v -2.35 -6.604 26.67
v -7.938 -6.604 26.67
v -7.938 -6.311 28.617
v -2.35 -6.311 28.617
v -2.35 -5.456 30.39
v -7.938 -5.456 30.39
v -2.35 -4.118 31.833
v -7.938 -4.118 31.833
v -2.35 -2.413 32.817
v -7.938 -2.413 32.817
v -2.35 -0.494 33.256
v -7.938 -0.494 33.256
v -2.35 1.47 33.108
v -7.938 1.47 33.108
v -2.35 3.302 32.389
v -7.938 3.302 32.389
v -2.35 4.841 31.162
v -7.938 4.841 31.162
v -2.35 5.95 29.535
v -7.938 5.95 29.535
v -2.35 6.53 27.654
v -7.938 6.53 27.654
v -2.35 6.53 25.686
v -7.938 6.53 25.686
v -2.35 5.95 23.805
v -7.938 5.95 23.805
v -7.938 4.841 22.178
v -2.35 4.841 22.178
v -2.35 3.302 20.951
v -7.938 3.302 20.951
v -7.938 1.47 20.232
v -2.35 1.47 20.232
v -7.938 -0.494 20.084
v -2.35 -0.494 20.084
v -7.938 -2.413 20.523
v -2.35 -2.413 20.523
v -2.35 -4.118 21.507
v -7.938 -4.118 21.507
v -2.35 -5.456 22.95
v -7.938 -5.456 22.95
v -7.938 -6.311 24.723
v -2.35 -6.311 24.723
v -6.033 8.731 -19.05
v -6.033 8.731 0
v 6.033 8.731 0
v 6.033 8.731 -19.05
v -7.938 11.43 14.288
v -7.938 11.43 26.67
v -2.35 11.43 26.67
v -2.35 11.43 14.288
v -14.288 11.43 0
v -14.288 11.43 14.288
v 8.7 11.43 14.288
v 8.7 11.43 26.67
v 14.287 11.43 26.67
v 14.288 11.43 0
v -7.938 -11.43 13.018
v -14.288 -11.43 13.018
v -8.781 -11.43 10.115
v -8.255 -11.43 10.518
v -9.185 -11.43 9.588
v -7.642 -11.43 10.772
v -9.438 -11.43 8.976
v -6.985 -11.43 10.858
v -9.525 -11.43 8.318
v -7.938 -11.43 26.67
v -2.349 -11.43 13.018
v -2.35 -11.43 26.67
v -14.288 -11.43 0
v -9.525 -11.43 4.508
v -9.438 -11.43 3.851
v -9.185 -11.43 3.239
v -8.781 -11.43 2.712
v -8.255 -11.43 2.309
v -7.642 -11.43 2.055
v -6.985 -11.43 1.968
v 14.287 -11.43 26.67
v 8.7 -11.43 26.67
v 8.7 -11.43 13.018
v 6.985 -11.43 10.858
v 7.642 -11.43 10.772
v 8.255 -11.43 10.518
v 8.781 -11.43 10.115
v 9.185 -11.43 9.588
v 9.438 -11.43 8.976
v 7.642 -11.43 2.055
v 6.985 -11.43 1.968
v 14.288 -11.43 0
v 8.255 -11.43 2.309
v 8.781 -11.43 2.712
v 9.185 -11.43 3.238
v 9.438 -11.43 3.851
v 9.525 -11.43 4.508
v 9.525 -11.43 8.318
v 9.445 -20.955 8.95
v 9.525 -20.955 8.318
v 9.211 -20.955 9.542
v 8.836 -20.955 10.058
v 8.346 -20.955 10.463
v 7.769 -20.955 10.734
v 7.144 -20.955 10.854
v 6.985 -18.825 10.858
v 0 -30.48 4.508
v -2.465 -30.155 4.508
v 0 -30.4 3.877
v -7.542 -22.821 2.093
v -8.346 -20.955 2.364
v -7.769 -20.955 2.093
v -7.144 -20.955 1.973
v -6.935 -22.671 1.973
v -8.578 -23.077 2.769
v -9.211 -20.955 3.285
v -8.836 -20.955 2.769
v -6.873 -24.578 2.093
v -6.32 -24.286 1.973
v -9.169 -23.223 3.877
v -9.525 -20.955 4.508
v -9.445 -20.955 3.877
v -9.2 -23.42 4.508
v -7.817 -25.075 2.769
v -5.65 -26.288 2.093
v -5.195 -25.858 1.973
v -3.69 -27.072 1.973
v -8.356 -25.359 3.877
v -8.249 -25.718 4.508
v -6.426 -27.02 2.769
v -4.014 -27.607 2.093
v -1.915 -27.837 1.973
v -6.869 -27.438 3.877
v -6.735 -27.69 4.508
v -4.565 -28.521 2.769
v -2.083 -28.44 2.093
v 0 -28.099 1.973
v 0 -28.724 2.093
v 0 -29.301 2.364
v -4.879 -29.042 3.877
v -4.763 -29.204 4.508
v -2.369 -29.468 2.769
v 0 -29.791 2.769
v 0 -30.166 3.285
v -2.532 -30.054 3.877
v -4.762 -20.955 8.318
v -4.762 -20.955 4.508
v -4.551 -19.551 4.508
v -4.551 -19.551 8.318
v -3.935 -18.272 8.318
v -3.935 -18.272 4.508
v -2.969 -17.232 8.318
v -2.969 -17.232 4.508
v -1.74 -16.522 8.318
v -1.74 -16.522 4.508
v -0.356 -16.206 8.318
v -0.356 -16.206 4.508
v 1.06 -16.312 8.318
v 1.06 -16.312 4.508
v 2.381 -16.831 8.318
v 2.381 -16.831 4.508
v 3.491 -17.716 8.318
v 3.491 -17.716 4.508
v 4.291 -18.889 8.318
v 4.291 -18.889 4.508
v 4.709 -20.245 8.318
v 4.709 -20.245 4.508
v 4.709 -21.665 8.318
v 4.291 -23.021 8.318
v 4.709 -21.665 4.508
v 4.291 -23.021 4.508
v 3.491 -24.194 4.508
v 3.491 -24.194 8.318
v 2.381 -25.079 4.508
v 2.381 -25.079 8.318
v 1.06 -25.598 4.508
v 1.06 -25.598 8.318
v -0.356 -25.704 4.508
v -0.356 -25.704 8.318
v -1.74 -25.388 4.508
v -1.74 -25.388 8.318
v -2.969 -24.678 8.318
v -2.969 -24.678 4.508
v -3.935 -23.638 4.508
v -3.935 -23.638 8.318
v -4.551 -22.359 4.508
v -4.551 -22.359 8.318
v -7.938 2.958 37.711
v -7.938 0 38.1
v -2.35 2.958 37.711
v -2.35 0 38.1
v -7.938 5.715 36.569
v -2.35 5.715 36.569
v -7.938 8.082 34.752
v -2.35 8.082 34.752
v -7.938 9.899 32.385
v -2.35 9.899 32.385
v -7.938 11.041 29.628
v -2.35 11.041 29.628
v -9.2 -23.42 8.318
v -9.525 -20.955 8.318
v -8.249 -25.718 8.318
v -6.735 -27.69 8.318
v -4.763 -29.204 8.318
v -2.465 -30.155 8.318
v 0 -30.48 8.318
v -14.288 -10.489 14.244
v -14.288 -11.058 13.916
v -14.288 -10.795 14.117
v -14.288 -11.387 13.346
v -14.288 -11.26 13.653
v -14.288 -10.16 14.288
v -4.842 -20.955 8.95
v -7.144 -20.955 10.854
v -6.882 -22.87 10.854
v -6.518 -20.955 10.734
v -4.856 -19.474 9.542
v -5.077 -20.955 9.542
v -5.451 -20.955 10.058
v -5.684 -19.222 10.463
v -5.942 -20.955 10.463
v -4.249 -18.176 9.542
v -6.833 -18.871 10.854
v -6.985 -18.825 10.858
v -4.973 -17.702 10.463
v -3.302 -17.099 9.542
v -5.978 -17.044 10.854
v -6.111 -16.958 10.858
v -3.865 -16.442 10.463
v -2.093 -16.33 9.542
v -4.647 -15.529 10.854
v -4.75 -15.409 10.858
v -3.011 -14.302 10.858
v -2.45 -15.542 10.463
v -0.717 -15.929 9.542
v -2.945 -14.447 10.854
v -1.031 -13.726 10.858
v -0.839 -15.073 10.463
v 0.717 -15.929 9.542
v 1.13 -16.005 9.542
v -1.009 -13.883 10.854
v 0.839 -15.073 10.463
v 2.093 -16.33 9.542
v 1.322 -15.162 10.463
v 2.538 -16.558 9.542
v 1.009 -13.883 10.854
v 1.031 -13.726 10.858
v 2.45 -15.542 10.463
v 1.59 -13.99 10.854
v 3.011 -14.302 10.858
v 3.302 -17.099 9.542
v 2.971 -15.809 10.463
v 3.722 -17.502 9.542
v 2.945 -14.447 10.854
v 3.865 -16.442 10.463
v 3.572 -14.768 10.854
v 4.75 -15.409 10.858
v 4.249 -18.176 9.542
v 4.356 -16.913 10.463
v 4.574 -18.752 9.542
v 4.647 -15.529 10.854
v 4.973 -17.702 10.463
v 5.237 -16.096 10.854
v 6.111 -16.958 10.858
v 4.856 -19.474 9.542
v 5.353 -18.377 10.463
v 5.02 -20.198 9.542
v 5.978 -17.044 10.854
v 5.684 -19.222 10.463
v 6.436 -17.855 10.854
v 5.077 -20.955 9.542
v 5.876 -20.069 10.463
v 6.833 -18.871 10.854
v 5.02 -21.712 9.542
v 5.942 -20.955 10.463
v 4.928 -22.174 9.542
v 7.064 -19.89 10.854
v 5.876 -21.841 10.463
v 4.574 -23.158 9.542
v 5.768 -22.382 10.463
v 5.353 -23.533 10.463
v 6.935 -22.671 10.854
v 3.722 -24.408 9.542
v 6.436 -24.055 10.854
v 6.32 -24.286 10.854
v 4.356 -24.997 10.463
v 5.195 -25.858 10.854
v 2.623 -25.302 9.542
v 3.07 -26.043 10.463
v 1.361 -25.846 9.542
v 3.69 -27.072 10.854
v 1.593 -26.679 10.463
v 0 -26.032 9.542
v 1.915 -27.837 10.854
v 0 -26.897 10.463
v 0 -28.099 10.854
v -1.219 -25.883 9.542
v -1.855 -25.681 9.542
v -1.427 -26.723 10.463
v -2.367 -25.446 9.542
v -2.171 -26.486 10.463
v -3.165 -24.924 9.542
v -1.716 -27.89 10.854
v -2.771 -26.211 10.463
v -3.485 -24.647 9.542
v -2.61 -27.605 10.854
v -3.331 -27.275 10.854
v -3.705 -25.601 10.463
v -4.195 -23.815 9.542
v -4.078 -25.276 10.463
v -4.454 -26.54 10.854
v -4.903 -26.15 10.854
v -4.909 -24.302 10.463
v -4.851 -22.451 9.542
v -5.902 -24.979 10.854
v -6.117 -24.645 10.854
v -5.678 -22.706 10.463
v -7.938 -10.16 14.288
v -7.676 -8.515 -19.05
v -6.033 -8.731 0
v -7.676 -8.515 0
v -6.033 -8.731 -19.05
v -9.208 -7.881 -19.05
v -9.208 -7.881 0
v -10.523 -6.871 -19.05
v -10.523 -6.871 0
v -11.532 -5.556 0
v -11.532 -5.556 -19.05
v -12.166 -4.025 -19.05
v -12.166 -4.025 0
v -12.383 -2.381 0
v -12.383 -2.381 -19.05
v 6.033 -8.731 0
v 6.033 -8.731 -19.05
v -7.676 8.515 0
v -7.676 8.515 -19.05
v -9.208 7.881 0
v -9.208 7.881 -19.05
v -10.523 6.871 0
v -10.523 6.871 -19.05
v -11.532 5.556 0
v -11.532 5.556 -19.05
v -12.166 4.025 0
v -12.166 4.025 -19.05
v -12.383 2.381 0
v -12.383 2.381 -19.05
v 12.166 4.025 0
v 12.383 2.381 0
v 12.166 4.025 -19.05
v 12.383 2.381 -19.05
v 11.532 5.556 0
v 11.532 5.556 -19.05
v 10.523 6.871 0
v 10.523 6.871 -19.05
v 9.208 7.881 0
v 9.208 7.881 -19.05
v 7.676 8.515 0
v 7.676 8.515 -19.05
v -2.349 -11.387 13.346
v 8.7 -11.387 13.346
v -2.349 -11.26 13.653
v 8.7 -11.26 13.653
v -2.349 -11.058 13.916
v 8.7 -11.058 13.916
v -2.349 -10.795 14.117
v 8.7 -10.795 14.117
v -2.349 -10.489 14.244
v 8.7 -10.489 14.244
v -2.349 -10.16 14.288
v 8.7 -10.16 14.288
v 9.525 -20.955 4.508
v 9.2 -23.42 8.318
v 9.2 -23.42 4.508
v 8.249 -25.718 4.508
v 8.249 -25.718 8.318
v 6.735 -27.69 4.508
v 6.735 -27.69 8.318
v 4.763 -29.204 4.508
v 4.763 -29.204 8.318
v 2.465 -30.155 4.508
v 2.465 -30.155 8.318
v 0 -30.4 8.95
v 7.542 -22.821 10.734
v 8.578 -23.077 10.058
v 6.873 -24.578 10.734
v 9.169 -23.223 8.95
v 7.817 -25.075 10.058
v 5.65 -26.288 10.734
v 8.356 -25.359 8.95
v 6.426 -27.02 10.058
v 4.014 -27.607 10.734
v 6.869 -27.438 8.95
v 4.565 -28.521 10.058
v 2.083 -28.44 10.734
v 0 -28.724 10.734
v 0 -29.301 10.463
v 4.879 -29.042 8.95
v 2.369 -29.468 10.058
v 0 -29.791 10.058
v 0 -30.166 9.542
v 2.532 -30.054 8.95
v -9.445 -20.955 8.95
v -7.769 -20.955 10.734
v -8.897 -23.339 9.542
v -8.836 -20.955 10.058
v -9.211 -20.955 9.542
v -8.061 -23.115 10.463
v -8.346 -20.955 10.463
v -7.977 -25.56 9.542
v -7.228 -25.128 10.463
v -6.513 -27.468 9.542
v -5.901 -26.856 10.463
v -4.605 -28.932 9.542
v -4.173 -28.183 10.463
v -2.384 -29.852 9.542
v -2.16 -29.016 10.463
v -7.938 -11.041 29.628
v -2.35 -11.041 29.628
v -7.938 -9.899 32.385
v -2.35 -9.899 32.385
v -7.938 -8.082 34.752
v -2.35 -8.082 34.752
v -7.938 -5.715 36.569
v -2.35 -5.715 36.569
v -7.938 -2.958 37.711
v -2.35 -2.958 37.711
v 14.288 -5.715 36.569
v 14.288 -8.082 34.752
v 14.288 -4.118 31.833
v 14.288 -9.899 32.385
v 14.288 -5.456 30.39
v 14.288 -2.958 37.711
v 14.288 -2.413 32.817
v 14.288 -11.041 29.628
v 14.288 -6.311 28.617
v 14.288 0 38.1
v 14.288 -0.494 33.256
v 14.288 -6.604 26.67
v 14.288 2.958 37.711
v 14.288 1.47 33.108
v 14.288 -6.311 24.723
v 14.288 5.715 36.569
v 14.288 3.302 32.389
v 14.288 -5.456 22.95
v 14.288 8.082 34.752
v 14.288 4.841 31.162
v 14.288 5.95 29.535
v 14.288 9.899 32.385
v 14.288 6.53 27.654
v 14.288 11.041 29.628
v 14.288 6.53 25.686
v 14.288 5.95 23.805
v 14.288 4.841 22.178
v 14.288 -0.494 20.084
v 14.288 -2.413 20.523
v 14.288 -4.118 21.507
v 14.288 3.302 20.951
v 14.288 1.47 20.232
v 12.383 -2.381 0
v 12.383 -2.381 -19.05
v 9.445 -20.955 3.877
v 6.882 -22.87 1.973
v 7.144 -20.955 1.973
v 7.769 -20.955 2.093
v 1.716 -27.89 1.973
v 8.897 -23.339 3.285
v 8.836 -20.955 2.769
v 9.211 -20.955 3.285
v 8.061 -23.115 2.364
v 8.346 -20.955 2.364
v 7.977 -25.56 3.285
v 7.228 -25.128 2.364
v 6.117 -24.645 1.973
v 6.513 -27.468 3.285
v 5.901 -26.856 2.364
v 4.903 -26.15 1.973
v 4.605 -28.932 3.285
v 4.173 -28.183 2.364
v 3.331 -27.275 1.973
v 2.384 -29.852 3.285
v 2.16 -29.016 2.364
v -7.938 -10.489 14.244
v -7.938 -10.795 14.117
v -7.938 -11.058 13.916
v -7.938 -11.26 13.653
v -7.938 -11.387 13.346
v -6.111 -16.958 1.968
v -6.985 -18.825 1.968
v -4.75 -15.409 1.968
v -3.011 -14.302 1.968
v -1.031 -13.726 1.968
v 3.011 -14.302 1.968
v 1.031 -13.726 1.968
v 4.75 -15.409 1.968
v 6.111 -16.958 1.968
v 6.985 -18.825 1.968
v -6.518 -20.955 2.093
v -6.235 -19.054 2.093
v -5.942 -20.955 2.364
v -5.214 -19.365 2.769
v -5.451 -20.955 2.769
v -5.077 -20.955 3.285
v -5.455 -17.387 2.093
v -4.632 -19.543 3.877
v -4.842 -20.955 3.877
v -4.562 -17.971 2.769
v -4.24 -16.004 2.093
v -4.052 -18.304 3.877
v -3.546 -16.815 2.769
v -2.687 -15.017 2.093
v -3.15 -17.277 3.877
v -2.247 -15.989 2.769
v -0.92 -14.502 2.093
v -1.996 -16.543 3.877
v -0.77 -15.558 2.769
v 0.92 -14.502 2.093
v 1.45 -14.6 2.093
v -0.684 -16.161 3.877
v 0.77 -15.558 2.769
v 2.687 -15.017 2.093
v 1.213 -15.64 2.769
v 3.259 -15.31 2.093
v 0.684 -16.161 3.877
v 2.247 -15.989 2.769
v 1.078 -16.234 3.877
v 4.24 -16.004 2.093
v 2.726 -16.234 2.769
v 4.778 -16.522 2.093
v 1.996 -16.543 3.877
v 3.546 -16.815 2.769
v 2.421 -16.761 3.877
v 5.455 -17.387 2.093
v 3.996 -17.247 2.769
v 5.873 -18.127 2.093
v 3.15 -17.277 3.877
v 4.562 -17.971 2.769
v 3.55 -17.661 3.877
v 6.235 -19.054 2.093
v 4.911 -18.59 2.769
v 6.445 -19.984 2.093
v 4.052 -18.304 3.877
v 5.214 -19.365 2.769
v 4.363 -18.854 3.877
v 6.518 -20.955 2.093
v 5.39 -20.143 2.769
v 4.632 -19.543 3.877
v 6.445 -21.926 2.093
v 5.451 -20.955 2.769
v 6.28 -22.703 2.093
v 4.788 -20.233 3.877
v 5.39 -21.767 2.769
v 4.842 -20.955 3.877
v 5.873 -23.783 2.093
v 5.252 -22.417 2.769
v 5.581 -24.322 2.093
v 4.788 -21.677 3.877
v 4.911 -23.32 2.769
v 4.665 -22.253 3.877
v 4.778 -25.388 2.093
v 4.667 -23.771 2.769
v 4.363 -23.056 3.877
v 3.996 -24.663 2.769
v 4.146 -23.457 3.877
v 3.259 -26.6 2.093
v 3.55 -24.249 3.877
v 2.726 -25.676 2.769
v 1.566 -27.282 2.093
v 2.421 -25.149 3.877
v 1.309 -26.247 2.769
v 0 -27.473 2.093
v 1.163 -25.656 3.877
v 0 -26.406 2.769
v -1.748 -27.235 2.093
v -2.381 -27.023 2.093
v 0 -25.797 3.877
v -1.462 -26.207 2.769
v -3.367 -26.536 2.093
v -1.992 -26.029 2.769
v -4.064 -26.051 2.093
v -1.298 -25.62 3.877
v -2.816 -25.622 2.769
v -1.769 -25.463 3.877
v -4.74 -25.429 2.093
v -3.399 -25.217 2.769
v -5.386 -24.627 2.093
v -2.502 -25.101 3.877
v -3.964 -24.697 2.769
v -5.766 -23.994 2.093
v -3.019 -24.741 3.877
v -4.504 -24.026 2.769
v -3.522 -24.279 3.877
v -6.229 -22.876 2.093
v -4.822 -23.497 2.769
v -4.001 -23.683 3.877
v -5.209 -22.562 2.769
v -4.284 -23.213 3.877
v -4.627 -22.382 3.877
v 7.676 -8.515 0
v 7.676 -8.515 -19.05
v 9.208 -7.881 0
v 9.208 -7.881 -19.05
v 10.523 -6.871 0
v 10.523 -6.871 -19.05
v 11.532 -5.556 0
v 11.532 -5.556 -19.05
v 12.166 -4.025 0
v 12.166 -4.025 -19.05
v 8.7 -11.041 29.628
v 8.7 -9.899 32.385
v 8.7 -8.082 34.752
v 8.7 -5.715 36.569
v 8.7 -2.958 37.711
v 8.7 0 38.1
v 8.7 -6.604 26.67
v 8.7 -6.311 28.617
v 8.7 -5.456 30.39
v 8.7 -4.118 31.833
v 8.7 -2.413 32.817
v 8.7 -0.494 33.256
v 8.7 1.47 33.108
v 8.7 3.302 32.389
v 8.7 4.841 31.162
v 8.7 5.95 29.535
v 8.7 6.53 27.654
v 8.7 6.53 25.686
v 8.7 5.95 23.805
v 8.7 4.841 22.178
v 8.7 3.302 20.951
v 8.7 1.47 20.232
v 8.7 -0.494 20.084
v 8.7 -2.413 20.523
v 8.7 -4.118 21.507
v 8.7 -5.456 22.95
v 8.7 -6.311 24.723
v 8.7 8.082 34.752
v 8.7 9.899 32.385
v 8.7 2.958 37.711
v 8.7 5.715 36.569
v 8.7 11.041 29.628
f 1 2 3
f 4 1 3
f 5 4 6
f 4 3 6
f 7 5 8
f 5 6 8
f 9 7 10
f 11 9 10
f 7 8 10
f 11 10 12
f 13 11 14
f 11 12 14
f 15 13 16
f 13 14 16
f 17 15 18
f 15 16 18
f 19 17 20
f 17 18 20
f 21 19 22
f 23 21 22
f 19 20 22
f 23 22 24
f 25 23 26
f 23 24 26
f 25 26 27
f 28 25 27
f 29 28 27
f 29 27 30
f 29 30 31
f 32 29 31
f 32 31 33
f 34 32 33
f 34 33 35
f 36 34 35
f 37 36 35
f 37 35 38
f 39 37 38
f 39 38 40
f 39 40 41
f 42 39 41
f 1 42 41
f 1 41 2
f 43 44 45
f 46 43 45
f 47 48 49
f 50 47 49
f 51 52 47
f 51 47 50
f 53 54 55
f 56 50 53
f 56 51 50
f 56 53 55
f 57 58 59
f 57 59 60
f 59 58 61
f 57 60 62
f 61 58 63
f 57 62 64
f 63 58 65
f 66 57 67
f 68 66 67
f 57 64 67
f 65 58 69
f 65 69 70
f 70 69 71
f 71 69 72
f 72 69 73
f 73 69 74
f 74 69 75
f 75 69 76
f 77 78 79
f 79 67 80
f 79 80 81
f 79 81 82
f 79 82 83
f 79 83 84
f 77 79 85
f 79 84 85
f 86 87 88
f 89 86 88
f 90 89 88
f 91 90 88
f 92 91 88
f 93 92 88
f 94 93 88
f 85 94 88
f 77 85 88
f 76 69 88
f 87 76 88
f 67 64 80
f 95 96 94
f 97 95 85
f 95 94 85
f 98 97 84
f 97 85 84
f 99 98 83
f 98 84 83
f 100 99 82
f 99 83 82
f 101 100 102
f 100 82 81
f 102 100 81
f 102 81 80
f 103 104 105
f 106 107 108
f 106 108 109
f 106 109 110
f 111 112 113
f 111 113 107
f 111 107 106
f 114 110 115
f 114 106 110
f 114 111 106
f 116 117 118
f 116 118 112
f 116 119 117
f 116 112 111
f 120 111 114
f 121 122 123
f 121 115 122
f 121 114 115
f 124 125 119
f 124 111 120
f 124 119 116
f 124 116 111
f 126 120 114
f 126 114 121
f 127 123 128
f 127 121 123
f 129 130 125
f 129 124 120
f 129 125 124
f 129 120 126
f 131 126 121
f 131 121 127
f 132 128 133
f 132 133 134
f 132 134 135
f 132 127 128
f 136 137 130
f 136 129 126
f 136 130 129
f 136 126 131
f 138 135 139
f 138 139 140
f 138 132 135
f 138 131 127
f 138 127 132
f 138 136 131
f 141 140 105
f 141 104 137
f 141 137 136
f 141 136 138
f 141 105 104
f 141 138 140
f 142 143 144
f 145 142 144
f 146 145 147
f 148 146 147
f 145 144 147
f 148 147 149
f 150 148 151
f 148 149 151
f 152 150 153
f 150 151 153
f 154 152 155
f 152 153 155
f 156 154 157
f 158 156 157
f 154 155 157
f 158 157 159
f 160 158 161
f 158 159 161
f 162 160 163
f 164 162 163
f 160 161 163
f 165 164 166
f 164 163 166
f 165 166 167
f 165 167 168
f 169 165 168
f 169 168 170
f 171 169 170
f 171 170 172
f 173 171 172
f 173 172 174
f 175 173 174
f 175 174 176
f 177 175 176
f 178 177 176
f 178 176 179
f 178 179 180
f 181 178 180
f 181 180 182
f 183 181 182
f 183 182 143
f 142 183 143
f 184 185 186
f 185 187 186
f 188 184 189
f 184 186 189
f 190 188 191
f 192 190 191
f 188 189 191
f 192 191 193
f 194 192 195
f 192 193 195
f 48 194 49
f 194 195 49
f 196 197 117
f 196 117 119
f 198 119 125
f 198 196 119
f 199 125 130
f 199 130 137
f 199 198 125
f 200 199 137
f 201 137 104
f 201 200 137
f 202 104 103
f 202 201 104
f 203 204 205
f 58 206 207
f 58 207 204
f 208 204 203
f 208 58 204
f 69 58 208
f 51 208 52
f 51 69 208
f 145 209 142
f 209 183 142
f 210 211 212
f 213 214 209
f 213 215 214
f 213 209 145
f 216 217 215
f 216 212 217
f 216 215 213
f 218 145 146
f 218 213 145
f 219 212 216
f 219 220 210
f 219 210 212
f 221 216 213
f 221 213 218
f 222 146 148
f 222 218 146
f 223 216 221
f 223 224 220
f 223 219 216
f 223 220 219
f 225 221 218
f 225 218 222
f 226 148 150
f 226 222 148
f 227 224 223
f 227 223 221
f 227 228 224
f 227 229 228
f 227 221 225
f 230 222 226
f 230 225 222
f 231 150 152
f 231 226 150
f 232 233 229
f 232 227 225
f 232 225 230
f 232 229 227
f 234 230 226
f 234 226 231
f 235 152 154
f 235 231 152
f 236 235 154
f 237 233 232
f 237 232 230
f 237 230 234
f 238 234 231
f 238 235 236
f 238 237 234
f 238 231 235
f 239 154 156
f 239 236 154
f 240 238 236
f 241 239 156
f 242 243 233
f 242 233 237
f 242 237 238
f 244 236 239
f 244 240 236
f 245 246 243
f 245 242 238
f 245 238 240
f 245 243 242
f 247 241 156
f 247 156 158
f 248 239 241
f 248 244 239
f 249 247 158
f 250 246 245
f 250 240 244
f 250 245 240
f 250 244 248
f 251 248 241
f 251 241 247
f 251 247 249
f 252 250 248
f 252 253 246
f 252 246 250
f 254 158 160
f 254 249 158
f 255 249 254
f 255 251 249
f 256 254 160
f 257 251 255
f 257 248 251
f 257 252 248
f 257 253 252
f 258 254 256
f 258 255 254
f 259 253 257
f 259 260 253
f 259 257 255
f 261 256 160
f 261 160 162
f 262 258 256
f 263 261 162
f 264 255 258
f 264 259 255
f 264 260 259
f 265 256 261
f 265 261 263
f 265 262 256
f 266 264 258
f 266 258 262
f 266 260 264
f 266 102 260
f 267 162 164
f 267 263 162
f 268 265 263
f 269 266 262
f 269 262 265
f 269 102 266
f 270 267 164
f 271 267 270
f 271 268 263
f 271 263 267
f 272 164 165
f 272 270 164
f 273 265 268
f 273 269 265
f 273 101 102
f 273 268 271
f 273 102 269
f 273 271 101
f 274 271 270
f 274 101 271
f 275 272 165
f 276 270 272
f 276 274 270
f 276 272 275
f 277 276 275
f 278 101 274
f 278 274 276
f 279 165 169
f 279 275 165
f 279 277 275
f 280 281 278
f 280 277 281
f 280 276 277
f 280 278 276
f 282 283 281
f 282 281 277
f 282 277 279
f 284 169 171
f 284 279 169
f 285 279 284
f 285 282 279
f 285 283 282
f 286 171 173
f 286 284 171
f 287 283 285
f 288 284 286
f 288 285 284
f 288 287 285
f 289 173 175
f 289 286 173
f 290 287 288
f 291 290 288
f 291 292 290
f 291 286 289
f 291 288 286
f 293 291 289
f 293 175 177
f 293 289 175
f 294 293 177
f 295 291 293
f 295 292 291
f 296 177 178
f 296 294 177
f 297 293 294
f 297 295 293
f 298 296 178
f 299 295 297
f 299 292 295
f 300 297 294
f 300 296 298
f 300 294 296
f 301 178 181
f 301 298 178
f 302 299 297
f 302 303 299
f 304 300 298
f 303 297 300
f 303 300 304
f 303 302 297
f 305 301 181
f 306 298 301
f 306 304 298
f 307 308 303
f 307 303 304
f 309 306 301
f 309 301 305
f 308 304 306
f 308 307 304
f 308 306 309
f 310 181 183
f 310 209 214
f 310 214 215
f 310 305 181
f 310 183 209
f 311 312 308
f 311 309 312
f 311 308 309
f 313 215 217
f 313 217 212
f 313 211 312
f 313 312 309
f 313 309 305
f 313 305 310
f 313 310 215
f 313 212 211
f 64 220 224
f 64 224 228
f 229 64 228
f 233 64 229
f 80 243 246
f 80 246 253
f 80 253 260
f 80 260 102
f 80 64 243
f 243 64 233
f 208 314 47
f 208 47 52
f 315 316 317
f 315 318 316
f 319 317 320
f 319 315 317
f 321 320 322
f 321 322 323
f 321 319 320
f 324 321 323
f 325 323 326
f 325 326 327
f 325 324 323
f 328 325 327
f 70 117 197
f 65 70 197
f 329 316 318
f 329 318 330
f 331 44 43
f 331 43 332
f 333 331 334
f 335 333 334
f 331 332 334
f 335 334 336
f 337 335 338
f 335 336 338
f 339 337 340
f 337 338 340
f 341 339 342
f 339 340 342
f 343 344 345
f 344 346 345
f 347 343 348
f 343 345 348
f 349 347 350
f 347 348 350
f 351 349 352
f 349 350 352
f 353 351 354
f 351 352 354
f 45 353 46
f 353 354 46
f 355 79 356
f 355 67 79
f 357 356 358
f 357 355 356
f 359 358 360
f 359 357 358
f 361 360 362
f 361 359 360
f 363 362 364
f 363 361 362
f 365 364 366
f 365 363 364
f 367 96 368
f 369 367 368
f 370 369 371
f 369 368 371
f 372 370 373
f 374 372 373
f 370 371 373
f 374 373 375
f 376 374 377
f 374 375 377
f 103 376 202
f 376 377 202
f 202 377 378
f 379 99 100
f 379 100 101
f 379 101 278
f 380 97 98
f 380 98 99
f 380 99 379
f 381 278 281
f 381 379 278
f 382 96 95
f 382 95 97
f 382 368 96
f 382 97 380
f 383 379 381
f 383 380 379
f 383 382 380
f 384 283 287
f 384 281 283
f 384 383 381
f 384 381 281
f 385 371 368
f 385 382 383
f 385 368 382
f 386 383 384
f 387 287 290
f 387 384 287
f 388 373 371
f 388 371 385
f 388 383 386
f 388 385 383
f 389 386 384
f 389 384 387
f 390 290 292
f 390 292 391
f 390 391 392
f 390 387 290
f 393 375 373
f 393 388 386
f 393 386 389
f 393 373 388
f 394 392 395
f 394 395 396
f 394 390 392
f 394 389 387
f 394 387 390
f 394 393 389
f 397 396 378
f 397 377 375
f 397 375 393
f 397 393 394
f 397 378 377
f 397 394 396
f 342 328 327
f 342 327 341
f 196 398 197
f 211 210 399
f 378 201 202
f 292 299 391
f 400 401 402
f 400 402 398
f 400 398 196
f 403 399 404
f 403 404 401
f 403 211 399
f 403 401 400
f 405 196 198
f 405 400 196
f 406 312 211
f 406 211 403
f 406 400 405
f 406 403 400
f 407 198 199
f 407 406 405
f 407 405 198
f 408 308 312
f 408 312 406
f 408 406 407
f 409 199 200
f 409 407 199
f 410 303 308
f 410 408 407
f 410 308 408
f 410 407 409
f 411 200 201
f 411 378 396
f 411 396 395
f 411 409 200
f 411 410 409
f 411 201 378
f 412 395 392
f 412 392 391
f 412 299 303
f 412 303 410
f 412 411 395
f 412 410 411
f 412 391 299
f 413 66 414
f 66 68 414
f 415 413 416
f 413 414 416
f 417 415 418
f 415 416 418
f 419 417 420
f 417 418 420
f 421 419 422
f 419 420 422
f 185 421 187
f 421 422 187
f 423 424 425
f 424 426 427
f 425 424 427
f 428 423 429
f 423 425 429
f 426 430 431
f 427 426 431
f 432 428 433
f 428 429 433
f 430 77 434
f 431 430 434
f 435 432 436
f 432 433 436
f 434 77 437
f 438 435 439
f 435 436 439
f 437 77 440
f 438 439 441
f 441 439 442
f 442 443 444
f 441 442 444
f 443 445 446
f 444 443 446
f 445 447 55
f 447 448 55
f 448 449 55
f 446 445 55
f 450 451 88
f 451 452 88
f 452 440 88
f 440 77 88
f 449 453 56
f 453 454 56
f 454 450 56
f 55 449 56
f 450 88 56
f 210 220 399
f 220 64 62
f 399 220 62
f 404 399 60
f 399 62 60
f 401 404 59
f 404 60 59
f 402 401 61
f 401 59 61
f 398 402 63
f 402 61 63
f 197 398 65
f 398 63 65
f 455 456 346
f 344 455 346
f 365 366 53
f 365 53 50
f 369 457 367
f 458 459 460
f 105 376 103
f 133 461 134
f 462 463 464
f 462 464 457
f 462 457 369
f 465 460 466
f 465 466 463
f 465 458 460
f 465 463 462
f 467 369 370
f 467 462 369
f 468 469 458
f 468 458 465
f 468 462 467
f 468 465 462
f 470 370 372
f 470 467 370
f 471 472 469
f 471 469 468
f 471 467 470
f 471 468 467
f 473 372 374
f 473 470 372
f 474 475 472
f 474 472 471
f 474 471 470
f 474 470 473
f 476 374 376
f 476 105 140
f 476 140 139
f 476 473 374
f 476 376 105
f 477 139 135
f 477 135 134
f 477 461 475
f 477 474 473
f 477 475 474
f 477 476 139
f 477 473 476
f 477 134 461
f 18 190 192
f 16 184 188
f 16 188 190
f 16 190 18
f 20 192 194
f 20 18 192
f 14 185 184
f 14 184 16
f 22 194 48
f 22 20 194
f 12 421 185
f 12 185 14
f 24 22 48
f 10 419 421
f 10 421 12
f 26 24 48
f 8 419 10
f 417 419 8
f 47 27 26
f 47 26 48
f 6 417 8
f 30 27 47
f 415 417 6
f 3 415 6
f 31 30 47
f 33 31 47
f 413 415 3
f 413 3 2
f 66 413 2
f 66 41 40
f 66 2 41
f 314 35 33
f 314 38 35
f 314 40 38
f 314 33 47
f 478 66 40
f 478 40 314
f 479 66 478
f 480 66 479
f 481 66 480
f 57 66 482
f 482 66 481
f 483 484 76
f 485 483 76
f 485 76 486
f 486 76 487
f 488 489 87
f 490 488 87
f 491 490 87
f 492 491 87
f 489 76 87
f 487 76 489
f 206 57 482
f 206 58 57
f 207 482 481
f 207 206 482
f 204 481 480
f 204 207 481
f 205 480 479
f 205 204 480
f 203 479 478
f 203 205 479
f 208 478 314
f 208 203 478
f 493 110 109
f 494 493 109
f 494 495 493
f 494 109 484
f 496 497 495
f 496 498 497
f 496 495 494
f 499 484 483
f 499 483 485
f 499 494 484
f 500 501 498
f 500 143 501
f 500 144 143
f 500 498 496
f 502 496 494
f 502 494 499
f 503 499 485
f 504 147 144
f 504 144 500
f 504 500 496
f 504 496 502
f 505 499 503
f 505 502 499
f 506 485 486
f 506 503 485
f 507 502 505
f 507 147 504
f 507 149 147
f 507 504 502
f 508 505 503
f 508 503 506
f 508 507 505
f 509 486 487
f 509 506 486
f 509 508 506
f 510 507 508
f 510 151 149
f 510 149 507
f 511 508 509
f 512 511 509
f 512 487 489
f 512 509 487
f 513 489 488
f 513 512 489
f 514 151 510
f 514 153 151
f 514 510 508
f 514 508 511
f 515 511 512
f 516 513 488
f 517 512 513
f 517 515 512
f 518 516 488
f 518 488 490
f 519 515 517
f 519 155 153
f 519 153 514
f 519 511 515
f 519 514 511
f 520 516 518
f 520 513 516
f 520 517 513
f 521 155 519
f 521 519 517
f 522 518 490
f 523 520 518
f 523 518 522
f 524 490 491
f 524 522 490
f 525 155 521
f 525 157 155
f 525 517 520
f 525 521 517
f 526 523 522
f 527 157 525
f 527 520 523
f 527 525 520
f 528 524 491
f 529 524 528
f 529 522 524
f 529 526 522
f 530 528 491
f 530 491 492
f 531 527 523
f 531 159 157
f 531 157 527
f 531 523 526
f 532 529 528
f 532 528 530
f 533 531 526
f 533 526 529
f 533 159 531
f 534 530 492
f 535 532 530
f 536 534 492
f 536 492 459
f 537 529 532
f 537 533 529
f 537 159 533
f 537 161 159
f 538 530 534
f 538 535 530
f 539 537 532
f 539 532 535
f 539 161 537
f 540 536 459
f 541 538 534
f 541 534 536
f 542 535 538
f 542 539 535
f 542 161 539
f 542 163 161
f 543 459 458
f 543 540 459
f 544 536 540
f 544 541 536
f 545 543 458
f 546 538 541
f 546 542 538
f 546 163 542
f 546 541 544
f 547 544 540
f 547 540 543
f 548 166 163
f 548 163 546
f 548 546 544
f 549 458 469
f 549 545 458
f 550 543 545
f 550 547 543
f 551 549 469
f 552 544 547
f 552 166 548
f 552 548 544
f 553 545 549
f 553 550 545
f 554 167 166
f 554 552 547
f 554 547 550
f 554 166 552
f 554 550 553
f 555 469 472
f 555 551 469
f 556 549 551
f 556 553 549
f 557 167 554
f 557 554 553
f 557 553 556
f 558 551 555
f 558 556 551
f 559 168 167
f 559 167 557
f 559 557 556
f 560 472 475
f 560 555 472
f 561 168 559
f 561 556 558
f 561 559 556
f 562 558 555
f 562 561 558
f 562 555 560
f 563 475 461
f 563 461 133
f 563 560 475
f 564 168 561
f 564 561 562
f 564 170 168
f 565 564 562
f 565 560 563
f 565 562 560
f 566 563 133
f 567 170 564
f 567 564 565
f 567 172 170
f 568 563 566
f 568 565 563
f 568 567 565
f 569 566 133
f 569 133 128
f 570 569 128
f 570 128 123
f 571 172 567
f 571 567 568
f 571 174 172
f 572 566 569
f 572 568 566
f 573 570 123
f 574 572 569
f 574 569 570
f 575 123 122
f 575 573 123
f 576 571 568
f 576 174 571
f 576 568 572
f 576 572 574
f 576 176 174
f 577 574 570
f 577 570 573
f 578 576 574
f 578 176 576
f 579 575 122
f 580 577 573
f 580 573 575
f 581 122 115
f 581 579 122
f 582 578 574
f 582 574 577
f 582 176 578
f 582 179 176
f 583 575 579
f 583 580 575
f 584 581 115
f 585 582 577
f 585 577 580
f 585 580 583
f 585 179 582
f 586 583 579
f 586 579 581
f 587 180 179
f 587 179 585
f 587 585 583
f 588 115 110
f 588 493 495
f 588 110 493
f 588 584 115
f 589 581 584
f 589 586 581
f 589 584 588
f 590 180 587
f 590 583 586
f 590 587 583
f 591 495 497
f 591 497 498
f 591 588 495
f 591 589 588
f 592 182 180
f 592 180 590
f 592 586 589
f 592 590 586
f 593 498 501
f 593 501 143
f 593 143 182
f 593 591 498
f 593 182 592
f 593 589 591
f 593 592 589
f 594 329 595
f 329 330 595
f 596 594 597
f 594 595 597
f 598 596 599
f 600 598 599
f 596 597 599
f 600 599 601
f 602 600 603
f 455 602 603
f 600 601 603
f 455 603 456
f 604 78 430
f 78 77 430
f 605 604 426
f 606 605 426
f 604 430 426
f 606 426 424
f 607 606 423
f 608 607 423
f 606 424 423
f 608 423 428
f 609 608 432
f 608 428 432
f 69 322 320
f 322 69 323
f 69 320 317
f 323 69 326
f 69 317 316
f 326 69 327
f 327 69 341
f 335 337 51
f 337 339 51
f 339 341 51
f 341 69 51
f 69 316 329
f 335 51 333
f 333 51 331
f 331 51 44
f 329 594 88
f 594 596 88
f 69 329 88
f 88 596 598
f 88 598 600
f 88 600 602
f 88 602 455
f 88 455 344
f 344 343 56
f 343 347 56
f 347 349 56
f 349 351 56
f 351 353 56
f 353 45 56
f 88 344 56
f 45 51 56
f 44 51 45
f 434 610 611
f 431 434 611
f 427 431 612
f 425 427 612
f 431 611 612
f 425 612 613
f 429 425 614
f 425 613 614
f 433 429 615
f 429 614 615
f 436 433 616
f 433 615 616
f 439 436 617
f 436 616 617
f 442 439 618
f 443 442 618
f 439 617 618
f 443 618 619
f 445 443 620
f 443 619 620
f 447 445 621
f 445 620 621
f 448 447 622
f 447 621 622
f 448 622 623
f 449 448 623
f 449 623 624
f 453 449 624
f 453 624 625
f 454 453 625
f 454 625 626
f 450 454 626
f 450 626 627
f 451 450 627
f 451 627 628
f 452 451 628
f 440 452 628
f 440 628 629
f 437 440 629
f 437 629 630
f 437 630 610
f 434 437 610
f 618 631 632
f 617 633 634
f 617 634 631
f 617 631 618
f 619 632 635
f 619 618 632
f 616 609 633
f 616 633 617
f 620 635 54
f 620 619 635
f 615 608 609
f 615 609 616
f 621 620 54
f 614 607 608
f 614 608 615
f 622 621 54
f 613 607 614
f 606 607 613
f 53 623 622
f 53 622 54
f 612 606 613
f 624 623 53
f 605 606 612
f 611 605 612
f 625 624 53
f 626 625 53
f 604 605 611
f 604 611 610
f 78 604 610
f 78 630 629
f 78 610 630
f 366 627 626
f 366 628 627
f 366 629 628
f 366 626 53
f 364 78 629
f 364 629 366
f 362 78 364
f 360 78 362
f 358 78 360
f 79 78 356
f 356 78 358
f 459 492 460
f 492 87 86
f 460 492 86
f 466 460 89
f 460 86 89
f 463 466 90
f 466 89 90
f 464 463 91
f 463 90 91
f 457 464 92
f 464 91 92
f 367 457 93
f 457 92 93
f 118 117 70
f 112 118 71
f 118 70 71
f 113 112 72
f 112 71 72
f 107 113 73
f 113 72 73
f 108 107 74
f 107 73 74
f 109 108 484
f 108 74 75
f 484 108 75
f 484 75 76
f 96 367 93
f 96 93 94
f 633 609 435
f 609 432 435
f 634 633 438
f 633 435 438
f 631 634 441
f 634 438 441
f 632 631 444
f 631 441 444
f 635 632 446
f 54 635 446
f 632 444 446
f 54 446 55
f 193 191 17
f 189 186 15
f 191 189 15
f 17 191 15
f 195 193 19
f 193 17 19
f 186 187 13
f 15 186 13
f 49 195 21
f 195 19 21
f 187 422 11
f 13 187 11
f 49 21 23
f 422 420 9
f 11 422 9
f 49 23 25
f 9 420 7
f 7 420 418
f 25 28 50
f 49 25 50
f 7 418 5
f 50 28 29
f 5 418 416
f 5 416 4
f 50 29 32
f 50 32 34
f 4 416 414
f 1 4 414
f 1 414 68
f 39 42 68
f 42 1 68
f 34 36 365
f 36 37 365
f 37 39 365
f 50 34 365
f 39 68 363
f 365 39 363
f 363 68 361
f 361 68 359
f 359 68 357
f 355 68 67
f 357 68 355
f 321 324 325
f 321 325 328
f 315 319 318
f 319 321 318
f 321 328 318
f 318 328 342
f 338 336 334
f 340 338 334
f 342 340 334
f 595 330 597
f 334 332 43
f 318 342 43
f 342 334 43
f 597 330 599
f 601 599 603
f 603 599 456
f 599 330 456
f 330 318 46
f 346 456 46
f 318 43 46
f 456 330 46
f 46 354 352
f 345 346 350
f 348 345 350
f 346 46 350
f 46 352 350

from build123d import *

# Parameters (mm, degrees)
SKETCH2_W           = 24.765
SKETCH2_H           = 17.4625
BOSS_EXTRUDE1_DEPTH = 19.05
SKETCH3_W           = 28.575
SKETCH3_H           = 22.86
BOSS_EXTRUDE2_DEPTH = 38.1
SKETCH4_W           = 6.35
SKETCH4_H           = 23.8125
SKETCH4_W_2         = 11.049
CUT_EXTRUDE1_DEPTH  = 47.6725
SKETCH5_W           = 19.05
SKETCH5_H           = 8.89
BOSS_EXTRUDE3_DEPTH = 19.05
FILLET1_R           = 9.525
SKETCH6_R           = 4.7625
CUT_EXTRUDE2_DEPTH  = 50.382672553
FILLET5_R           = 11.43
SKETCH7_R           = 6.604
CUT_EXTRUDE3_DEPTH  = 54.615212627
FILLET2_R           = 2.54
FILLET3_R           = 6.35
FILLET6_R           = 1.27


# Some blends are built 0.0001 mm under size
with BuildPart() as part:
    # Sketch2 → Boss-Extrude1 (new body)
    with BuildSketch(Plane.XY):
        Rectangle(SKETCH2_W, SKETCH2_H)
    extrude(amount=-BOSS_EXTRUDE1_DEPTH)

    # Sketch3 → Boss-Extrude2 (add)
    with BuildSketch(Plane.XY):
        Rectangle(SKETCH3_W, SKETCH3_H)
    extrude(amount=BOSS_EXTRUDE2_DEPTH)

    # Sketch4 → Cut-Extrude1 (cut, through all)
    with BuildSketch(Plane(origin=(0, -11.43, 0), x_dir=(-1, 0, 0), z_dir=(0, -1, 0))):
        with Locations((11.1125, -26.19375)):
            Rectangle(SKETCH4_W, SKETCH4_H)
        with Locations((-3.175, -26.19375)):
            Rectangle(SKETCH4_W_2, SKETCH4_H)
    extrude(amount=-CUT_EXTRUDE1_DEPTH, mode=Mode.SUBTRACT)

    # Sketch5 → Boss-Extrude3 (add)
    with BuildSketch(Plane.XZ.offset(11.43)):
        with Locations((0, 6.4135)):
            Rectangle(SKETCH5_W, SKETCH5_H)
    extrude(amount=BOSS_EXTRUDE3_DEPTH)

    # Fillet1
    fillet1_edges = [part.edges().sort_by_distance(p)[0] for p in [
        (9.525, -30.48, 6.4135),
        (-9.525, -30.48, 6.4135),
    ]]
    fillet(fillet1_edges, radius=FILLET1_R - 0.0001)  # a hair under: the kernel refuses the full size

    # Sketch6 → Cut-Extrude2 (cut, through all)
    with BuildSketch(Plane(origin=(0, 0, 1.9685), x_dir=(-1, 0, 0), z_dir=(0, 0, -1))):
        with Locations((0, -20.955)):
            Circle(SKETCH6_R)
    extrude(amount=-CUT_EXTRUDE2_DEPTH, mode=Mode.SUBTRACT)

    # Fillet5
    fillet5_edges = [part.edges().sort_by_distance(p)[0] for p in [
        (-5.1435, -11.43, 38.1),
        (-5.1435, 11.43, 38.1),
        (11.4935, 11.43, 38.1),
        (11.4935, -11.43, 38.1),
    ]]
    fillet(fillet5_edges, radius=FILLET5_R - 0.0001)  # a hair under: the kernel refuses the full size

    # Sketch7 → Cut-Extrude3 (cut, through all)
    with BuildSketch(Plane.ZY.offset(7.9375)):
        with Locations(Location((26.67, 0, 0), (0, 0, 270))):
            Circle(SKETCH7_R)
    extrude(amount=-CUT_EXTRUDE3_DEPTH, mode=Mode.SUBTRACT)

    # Fillet2
    # the kernel refuses this fillet: 2.54 mm, written as the material it takes off along each edge
    with BuildSketch(Plane(origin=(-9.525, -11.43, 10.8585), x_dir=(0, 0, -1), z_dir=(0, -1, 0))) as fillet2_piece_1:
        with BuildLine():
            CenterArc((FILLET2_R, FILLET2_R), FILLET2_R, 180, 90)
            Line((0, FILLET2_R), (0, 0))
            Line((0, 0), (FILLET2_R, 0))
        make_face()
    extrude(amount=9.5251, mode=Mode.SUBTRACT)
    with BuildSketch(Plane(origin=(9.525, -11.43, 10.8585), x_dir=(0, 0, -1), z_dir=(0, -1, 0)), Plane(origin=(9.525, -11.43, 1.9685), x_dir=(-1, 0, 0), z_dir=(0, -1, 0)), Plane(origin=(-9.525, -11.43, 1.9685), x_dir=(0, 0, 1), z_dir=(0, -1, 0))) as fillet2_piece_2:
        with BuildLine():
            CenterArc((FILLET2_R, -FILLET2_R), FILLET2_R, 90, 90)
            Line((0, -FILLET2_R), (0, 0))
            Line((0, 0), (FILLET2_R, 0))
        make_face()
    extrude(amount=9.5251, mode=Mode.SUBTRACT)
    with BuildSketch(Plane(origin=(-0.0001, -20.9551, 10.8585), x_dir=(-1, 0, 0), z_dir=(0, 1, 0))) as fillet2_piece_3:
        with BuildLine():
            CenterArc((9.5249 - FILLET2_R, -FILLET2_R), FILLET2_R, 360, 90)
            Line((9.5249, -FILLET2_R), (9.5249, 0))
            Line((9.5249, 0), (9.5249 - FILLET2_R, 0))
        make_face()
    revolve(axis=Axis((-0.0001, -20.9551, 10.8585), (0, 0, 1)), revolution_arc=90, mode=Mode.SUBTRACT)
    with BuildSketch(Plane(origin=(0.0001, -20.9551, 10.8585), x_dir=(1, 0, 0), z_dir=(0, 1, 0))) as fillet2_piece_4:
        with BuildLine():
            CenterArc((9.5249 - FILLET2_R, FILLET2_R), FILLET2_R, 270, 90)
            Line((9.5249, FILLET2_R), (9.5249, 0))
            Line((9.5249, 0), (9.5249 - FILLET2_R, 0))
        make_face()
    revolve(axis=Axis((0.0001, -20.9551, 10.8585), (0, 0, -1)), revolution_arc=90, mode=Mode.SUBTRACT)
    with BuildSketch(Plane(origin=(-0.0001, -20.9551, 1.9685), x_dir=(-1, 0, 0), z_dir=(0, 1, 0))) as fillet2_piece_5:
        with BuildLine():
            CenterArc((9.5249 - FILLET2_R, FILLET2_R), FILLET2_R, 270, 90)
            Line((9.5249, FILLET2_R), (9.5249, 0))
            Line((9.5249, 0), (9.5249 - FILLET2_R, 0))
        make_face()
    revolve(axis=Axis((-0.0001, -20.9551, 1.9685), (0, 0, 1)), revolution_arc=90, mode=Mode.SUBTRACT)
    with BuildSketch(Plane(origin=(0.0001, -20.9551, 1.9685), x_dir=(1, 0, 0), z_dir=(0, 1, 0))) as fillet2_piece_6:
        with BuildLine():
            CenterArc((9.5249 - FILLET2_R, -FILLET2_R), FILLET2_R, 0, 90)
            Line((9.5249, -FILLET2_R), (9.5249, 0))
            Line((9.5249, 0), (9.5249 - FILLET2_R, 0))
        make_face()
    revolve(axis=Axis((0.0001, -20.9551, 1.9685), (0, 0, -1)), revolution_arc=90, mode=Mode.SUBTRACT)
    with BuildSketch(Plane(origin=(0, -20.955, 10.8585), x_dir=(-1, 0, 0), z_dir=(0, -1, 0))) as fillet2_piece_7:
        with BuildLine():
            CenterArc((4.7625 + FILLET2_R, FILLET2_R), FILLET2_R, 180, 90)
            Line((4.7625, FILLET2_R), (4.7625, 0))
            Line((4.7625, 0), (4.7625 + FILLET2_R, 0))
        make_face()
    revolve(axis=Axis((0, -20.955, 10.8585), (0, 0, -1)), mode=Mode.SUBTRACT)
    with BuildSketch(Plane(origin=(0, -20.955, 1.9685), x_dir=(-1, 0, 0), z_dir=(0, -1, 0))) as fillet2_piece_8:
        with BuildLine():
            CenterArc((4.7625 + FILLET2_R, -FILLET2_R), FILLET2_R, 90, 90)
            Line((4.7625, -FILLET2_R), (4.7625, 0))
            Line((4.7625, 0), (4.7625 + FILLET2_R, 0))
        make_face()
    revolve(axis=Axis((0, -20.955, 1.9685), (0, 0, -1)), mode=Mode.SUBTRACT)
    with BuildSketch(Plane(origin=(0.0001, -30.48, 1.9685), x_dir=(0, 1, 0), z_dir=(-1, 0, 0)), Plane(origin=(-0.0001, -30.48, 10.8585), x_dir=(0, 1, 0), z_dir=(1, 0, 0))) as fillet2_piece_9:
        with BuildLine():
            CenterArc((FILLET2_R, -FILLET2_R), FILLET2_R, 90, 90)
            Line((0, -FILLET2_R), (0, 0))
            Line((0, 0), (FILLET2_R, 0))
        make_face()
    extrude(amount=0.0002, mode=Mode.SUBTRACT)

    # Fillet3
    fillet3_edges = [part.edges().sort_by_distance(p)[0] for p in [
        (-12.3825, 8.73125, -9.525),
        (12.3825, 8.73125, -9.525),
        (12.3825, -8.73125, -9.525),
        (-12.3825, -8.73125, -9.525),
    ]]
    fillet(fillet3_edges, radius=FILLET3_R)

    # Fillet6
    fillet6_edges = [part.edges().sort_by_distance(p)[0] for p in [
        (-11.1125, -11.43, 14.2875),
        (3.175, -11.43, 14.2875),
    ]]
    fillet(fillet6_edges, radius=FILLET6_R)


solid = part.part
